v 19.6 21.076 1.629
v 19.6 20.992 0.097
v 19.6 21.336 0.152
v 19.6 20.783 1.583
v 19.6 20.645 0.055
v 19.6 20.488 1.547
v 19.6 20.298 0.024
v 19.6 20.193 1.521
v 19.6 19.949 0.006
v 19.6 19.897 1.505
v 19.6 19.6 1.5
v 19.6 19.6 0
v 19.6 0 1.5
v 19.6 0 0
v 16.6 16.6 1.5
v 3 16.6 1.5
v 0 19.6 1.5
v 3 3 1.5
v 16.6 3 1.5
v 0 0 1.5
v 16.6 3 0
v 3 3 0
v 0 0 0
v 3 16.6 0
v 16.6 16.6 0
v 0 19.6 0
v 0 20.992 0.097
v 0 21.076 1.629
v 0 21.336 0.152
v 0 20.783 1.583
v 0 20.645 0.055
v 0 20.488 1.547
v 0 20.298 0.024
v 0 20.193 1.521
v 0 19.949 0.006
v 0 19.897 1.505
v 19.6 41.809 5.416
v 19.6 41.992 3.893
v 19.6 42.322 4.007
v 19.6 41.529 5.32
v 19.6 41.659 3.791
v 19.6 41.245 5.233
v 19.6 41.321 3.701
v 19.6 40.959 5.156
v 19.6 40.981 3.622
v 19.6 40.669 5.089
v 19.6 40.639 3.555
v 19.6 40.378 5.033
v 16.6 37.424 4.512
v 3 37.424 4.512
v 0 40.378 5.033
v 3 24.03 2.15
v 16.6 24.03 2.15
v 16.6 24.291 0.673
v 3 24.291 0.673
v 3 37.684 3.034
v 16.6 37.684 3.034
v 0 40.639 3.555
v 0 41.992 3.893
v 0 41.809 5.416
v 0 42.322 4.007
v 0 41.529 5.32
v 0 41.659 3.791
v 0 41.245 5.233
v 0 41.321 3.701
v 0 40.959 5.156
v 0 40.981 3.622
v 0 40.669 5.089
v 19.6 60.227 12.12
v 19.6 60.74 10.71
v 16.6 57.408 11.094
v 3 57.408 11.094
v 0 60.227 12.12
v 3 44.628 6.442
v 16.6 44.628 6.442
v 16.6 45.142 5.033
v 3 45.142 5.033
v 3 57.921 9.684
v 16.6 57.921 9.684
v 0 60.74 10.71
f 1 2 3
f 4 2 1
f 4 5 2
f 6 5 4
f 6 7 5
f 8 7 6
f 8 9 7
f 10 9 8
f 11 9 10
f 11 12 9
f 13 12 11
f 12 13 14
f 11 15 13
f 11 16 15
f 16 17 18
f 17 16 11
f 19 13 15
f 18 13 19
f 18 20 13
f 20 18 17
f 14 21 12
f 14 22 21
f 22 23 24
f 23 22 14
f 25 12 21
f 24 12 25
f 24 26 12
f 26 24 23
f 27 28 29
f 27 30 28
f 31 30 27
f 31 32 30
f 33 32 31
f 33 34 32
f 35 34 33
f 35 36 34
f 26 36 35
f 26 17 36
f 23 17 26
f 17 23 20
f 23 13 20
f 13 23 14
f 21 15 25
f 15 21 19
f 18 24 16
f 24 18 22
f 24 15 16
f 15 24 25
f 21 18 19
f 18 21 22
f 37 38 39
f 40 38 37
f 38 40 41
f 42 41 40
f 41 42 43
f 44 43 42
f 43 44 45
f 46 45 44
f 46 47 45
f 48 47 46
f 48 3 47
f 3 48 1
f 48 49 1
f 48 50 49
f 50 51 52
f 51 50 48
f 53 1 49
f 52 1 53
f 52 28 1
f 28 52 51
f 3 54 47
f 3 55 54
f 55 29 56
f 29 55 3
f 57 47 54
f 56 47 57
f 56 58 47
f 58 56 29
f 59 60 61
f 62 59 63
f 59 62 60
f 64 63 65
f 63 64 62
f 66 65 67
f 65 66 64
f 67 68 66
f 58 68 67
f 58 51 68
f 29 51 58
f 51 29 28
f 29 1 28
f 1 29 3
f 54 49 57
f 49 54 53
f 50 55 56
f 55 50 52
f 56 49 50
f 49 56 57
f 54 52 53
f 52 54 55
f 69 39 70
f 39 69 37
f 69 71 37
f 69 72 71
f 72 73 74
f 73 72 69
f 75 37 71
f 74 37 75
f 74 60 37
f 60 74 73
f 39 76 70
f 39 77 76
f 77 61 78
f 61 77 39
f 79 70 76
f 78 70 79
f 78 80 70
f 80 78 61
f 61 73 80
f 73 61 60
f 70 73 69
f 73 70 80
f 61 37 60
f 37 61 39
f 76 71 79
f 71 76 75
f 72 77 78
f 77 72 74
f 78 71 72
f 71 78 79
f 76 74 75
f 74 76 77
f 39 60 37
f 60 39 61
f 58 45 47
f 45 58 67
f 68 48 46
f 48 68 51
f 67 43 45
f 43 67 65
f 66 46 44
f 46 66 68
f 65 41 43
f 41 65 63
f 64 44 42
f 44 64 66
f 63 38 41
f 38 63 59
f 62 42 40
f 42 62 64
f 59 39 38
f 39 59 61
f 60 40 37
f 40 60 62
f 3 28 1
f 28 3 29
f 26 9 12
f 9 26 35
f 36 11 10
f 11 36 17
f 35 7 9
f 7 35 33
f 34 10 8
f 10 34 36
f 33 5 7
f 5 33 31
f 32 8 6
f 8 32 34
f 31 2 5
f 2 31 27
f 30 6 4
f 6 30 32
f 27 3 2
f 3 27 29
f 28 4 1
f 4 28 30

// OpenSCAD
// Generated by SolidPython 1.1.3 on 2024-04-27 09:36:01


union() {
	translate(v = [0, 21.3364817767, 0.1519224699]) {
		rotate(a = [10, 0, 0]) {
			union() {
				translate(v = [0, 21.3364817767, 0.1519224699]) {
					rotate(a = [10, 0, 0]) {
						difference() {
							cube(size = [19.6000000000, 19.6000000000, 1.5000000000]);
							translate(v = [3, 3, 0]) {
								cube(size = [13.6000000000, 13.6000000000, 1.5000000000]);
							}
						}
					}
				}
				translate(v = [0, 19.6000000000, 0]) {
					rotate(a = [0, 90, 0]) {
						translate(v = [-10, 0, 0]) {
							rotate_extrude($fn = 180, angle = 10) {
								translate(v = [8.5000000000, 0, 0]) {
									square(size = [1.5000000000, 19.6000000000]);
								}
							}
						}
					}
				}
				difference() {
					cube(size = [19.6000000000, 19.6000000000, 1.5000000000]);
					translate(v = [3, 3, 0]) {
						cube(size = [13.6000000000, 13.6000000000, 1.5000000000]);
					}
				}
			}
		}
	}
	translate(v = [0, 19.6000000000, 0]) {
		rotate(a = [0, 90, 0]) {
			translate(v = [-10, 0, 0]) {
				rotate_extrude($fn = 180, angle = 10) {
					translate(v = [8.5000000000, 0, 0]) {
						square(size = [1.5000000000, 19.6000000000]);
					}
				}
			}
		}
	}
	difference() {
		cube(size = [19.6000000000, 19.6000000000, 1.5000000000]);
		translate(v = [3, 3, 0]) {
			cube(size = [13.6000000000, 13.6000000000, 1.5000000000]);
		}
	}
}
/***********************************************
*********      SolidPython code:      **********
************************************************
 
"""
Generates a "Black Hole" keyboard OpenSCAD file.
The created file should opened in OpenSCAD, rendered, exported as an STL and then 3D printed.

See repo for more information: https://github.com/Sam-Levoir/black-hole

All units are in mm and degrees as that is just how openSCAD does things.

Created by Sam Levoir - April 2024
"""

import math
import os
from solid import OpenSCADObject as shape, cube, translate, scad_render_to_file, rotate, square, rotate_extrude

# region Configurable Constants:
radius_for_key_hole_curvature = 10
angle_between_key_holes = 10
# endregion Configurable Constants

# region Constants Which Should Probably Be Left Alone:
segments = 180  # How round things are. Could be messed with, but no real need for it. This is a balance of round and renderable.
plate_height = 1.5  # Has to be 1.5mm for switches to snap in. Do not change! https://matt3o.com/anatomy-of-a-keyboard/.
key_hole_inner_width = 13.6  # 13.6mm is best by test. I tried a range from 13 - 15. The default is 14: https://matt3o.com/anatomy-of-a-keyboard/.
key_hole_rim_thickness = 3  # Should be just enough to hold the switch and no more.
# endregion Constants Which Should Probably Be Left Alone

# region Calculated Constants:
key_hole_outer_width = key_hole_inner_width + (2 * key_hole_rim_thickness)  # 1 rim thickness on each side of the hole.
# endregion CCalculated Constants


def main():
    black_hole_keyboard: shape = make_plate_strip(3)

    # https://stackoverflow.com/questions/5137497/find-the-current-directory-and-files-directory
    this_files_dir = os.path.dirname(os.path.realpath(__file__))
    output_file_path = os.path.join(this_files_dir, "..", "things", "black-hole.scad")
    scad_render_to_file(black_hole_keyboard, output_file_path)


def make_plate_strip(key_count: int) -> shape:
    # Make a keyhole, translate and rotate it into position.
    # Make another keyhole, join it to existing keyhole(s), translate and rotate whole thing into position.
    # Rinse repeat.
    plate_strip: shape | None = None
    for _ in range(key_count):
        key_hole = make_key_hole()

        if plate_strip:
            # There is an existing plate strip (of aggregated key holes) to add onto.
            # First, make a curved strip to join this new key hole to the existing ones.
            plate_face = square((plate_height, key_hole_outer_width))
            plate_face = translate((radius_for_key_hole_curvature - plate_height, 0, 0))(plate_face)
            joining_strip = rotate_extrude(angle_between_key_holes, segments=segments)(plate_face)
            joining_strip = translate((-(radius_for_key_hole_curvature), 0, 0))(joining_strip)
            joining_strip = rotate((0, 90, 0))(joining_strip)
            joining_strip = translate((0, key_hole_outer_width, 0))(joining_strip)

            # Now, rotate the existing key holes and move them over into place.
            plate_strip = rotate((angle_between_key_holes, 0, 0))(plate_strip)

            # Then move it over.
            y_translation_distance_for_rotation = radius_for_key_hole_curvature * sin(angle_between_key_holes)
            z_translation_distance_for_rotation = radius_for_key_hole_curvature - math.sqrt(
                math.pow(radius_for_key_hole_curvature, 2) - math.pow(y_translation_distance_for_rotation, 2)
            )
            y_translation_distance = key_hole_outer_width + y_translation_distance_for_rotation
            plate_strip = translate((0, y_translation_distance, z_translation_distance_for_rotation))(plate_strip)

            # Now put everything together!
            plate_strip += joining_strip
            plate_strip += key_hole
        else:
            # There is no existing plate strip, then this key hole is the start of the plate strip!
            plate_strip = key_hole

    # This will only ever be None if someone passes a key_count of 0. Garbage in, garbage out.
    return plate_strip  # type: ignore


def make_key_hole() -> shape:
    outer_cube = cube([key_hole_outer_width, key_hole_outer_width, plate_height])
    inner_cube = cube([key_hole_inner_width, key_hole_inner_width, plate_height])

    # We need to translate the inner cube so that it is centered inside of the outer cube.
    # Translate it by the thickness of the rim in both the x and y directions to put it in the center.
    inner_cube = translate((key_hole_rim_thickness, key_hole_rim_thickness, 0))(inner_cube)

    # Then just cut the inner cube out of the outer, and we have a keyhole!
    key_hole = outer_cube - inner_cube
    return key_hole


def cos(angle_in_degrees: float):
    return math.cos(math.radians(angle_in_degrees))


def sin(angle_in_degrees: float):
    return math.sin(math.radians(angle_in_degrees))


def tan(angle_in_degrees: float):
    return math.tan(math.radians(angle_in_degrees))


if __name__ == "__main__":
    main()
 
 
************************************************/
